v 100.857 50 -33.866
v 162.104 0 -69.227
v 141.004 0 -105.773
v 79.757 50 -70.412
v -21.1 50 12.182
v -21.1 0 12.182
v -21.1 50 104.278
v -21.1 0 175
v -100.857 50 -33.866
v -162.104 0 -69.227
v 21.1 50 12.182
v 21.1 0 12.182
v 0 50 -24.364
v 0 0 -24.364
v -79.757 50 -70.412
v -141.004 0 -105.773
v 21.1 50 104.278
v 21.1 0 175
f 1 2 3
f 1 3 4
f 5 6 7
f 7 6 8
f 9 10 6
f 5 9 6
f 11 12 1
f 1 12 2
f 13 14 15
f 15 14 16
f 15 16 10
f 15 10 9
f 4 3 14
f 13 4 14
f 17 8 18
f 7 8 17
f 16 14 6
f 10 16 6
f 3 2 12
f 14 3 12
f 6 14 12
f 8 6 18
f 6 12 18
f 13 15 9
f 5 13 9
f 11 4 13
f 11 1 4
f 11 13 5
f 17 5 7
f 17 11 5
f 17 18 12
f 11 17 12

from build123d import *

# Parameters (mm, degrees)
BOSS_EXTRUDE2_DEPTH = 50
CUT_EXTRUDE1_DEPTH  = 42.2
CIRPATTERN1_COUNT   = 3


with BuildPart() as part:
    # Sketch3 → Boss-Extrude2 (new body)
    with BuildSketch(Plane(origin=(0, 0, 0), x_dir=(1, 0, 0), z_dir=(0, 1, 0))):
        Polygon((-21.1, -12.18209068), (-21.1, -175), (21.1, -175), (21.1, -12.18209068), (0, 0), align=None)
    boss_extrude2 = extrude(amount=BOSS_EXTRUDE2_DEPTH)

    # Sketch4 → Cut-Extrude1 (cut)
    with BuildSketch(Plane.ZY.offset(21.1)):
        Polygon((175, 0), (104.277828473, 50), (175, 50), align=None)
    cut_extrude1 = extrude(amount=-CUT_EXTRUDE1_DEPTH, mode=Mode.SUBTRACT)

    # CirPattern1: Boss-Extrude2, Cut-Extrude1 ×3 about axis
    cirpattern1_axis = Axis((0, 0, 0), (0, 1, 0))
    for i in range(1, CIRPATTERN1_COUNT):
        add(boss_extrude2.rotate(cirpattern1_axis, i * 360 / CIRPATTERN1_COUNT))
        add(cut_extrude1.rotate(cirpattern1_axis, i * 360 / CIRPATTERN1_COUNT), mode=Mode.SUBTRACT)


solid = part.part
